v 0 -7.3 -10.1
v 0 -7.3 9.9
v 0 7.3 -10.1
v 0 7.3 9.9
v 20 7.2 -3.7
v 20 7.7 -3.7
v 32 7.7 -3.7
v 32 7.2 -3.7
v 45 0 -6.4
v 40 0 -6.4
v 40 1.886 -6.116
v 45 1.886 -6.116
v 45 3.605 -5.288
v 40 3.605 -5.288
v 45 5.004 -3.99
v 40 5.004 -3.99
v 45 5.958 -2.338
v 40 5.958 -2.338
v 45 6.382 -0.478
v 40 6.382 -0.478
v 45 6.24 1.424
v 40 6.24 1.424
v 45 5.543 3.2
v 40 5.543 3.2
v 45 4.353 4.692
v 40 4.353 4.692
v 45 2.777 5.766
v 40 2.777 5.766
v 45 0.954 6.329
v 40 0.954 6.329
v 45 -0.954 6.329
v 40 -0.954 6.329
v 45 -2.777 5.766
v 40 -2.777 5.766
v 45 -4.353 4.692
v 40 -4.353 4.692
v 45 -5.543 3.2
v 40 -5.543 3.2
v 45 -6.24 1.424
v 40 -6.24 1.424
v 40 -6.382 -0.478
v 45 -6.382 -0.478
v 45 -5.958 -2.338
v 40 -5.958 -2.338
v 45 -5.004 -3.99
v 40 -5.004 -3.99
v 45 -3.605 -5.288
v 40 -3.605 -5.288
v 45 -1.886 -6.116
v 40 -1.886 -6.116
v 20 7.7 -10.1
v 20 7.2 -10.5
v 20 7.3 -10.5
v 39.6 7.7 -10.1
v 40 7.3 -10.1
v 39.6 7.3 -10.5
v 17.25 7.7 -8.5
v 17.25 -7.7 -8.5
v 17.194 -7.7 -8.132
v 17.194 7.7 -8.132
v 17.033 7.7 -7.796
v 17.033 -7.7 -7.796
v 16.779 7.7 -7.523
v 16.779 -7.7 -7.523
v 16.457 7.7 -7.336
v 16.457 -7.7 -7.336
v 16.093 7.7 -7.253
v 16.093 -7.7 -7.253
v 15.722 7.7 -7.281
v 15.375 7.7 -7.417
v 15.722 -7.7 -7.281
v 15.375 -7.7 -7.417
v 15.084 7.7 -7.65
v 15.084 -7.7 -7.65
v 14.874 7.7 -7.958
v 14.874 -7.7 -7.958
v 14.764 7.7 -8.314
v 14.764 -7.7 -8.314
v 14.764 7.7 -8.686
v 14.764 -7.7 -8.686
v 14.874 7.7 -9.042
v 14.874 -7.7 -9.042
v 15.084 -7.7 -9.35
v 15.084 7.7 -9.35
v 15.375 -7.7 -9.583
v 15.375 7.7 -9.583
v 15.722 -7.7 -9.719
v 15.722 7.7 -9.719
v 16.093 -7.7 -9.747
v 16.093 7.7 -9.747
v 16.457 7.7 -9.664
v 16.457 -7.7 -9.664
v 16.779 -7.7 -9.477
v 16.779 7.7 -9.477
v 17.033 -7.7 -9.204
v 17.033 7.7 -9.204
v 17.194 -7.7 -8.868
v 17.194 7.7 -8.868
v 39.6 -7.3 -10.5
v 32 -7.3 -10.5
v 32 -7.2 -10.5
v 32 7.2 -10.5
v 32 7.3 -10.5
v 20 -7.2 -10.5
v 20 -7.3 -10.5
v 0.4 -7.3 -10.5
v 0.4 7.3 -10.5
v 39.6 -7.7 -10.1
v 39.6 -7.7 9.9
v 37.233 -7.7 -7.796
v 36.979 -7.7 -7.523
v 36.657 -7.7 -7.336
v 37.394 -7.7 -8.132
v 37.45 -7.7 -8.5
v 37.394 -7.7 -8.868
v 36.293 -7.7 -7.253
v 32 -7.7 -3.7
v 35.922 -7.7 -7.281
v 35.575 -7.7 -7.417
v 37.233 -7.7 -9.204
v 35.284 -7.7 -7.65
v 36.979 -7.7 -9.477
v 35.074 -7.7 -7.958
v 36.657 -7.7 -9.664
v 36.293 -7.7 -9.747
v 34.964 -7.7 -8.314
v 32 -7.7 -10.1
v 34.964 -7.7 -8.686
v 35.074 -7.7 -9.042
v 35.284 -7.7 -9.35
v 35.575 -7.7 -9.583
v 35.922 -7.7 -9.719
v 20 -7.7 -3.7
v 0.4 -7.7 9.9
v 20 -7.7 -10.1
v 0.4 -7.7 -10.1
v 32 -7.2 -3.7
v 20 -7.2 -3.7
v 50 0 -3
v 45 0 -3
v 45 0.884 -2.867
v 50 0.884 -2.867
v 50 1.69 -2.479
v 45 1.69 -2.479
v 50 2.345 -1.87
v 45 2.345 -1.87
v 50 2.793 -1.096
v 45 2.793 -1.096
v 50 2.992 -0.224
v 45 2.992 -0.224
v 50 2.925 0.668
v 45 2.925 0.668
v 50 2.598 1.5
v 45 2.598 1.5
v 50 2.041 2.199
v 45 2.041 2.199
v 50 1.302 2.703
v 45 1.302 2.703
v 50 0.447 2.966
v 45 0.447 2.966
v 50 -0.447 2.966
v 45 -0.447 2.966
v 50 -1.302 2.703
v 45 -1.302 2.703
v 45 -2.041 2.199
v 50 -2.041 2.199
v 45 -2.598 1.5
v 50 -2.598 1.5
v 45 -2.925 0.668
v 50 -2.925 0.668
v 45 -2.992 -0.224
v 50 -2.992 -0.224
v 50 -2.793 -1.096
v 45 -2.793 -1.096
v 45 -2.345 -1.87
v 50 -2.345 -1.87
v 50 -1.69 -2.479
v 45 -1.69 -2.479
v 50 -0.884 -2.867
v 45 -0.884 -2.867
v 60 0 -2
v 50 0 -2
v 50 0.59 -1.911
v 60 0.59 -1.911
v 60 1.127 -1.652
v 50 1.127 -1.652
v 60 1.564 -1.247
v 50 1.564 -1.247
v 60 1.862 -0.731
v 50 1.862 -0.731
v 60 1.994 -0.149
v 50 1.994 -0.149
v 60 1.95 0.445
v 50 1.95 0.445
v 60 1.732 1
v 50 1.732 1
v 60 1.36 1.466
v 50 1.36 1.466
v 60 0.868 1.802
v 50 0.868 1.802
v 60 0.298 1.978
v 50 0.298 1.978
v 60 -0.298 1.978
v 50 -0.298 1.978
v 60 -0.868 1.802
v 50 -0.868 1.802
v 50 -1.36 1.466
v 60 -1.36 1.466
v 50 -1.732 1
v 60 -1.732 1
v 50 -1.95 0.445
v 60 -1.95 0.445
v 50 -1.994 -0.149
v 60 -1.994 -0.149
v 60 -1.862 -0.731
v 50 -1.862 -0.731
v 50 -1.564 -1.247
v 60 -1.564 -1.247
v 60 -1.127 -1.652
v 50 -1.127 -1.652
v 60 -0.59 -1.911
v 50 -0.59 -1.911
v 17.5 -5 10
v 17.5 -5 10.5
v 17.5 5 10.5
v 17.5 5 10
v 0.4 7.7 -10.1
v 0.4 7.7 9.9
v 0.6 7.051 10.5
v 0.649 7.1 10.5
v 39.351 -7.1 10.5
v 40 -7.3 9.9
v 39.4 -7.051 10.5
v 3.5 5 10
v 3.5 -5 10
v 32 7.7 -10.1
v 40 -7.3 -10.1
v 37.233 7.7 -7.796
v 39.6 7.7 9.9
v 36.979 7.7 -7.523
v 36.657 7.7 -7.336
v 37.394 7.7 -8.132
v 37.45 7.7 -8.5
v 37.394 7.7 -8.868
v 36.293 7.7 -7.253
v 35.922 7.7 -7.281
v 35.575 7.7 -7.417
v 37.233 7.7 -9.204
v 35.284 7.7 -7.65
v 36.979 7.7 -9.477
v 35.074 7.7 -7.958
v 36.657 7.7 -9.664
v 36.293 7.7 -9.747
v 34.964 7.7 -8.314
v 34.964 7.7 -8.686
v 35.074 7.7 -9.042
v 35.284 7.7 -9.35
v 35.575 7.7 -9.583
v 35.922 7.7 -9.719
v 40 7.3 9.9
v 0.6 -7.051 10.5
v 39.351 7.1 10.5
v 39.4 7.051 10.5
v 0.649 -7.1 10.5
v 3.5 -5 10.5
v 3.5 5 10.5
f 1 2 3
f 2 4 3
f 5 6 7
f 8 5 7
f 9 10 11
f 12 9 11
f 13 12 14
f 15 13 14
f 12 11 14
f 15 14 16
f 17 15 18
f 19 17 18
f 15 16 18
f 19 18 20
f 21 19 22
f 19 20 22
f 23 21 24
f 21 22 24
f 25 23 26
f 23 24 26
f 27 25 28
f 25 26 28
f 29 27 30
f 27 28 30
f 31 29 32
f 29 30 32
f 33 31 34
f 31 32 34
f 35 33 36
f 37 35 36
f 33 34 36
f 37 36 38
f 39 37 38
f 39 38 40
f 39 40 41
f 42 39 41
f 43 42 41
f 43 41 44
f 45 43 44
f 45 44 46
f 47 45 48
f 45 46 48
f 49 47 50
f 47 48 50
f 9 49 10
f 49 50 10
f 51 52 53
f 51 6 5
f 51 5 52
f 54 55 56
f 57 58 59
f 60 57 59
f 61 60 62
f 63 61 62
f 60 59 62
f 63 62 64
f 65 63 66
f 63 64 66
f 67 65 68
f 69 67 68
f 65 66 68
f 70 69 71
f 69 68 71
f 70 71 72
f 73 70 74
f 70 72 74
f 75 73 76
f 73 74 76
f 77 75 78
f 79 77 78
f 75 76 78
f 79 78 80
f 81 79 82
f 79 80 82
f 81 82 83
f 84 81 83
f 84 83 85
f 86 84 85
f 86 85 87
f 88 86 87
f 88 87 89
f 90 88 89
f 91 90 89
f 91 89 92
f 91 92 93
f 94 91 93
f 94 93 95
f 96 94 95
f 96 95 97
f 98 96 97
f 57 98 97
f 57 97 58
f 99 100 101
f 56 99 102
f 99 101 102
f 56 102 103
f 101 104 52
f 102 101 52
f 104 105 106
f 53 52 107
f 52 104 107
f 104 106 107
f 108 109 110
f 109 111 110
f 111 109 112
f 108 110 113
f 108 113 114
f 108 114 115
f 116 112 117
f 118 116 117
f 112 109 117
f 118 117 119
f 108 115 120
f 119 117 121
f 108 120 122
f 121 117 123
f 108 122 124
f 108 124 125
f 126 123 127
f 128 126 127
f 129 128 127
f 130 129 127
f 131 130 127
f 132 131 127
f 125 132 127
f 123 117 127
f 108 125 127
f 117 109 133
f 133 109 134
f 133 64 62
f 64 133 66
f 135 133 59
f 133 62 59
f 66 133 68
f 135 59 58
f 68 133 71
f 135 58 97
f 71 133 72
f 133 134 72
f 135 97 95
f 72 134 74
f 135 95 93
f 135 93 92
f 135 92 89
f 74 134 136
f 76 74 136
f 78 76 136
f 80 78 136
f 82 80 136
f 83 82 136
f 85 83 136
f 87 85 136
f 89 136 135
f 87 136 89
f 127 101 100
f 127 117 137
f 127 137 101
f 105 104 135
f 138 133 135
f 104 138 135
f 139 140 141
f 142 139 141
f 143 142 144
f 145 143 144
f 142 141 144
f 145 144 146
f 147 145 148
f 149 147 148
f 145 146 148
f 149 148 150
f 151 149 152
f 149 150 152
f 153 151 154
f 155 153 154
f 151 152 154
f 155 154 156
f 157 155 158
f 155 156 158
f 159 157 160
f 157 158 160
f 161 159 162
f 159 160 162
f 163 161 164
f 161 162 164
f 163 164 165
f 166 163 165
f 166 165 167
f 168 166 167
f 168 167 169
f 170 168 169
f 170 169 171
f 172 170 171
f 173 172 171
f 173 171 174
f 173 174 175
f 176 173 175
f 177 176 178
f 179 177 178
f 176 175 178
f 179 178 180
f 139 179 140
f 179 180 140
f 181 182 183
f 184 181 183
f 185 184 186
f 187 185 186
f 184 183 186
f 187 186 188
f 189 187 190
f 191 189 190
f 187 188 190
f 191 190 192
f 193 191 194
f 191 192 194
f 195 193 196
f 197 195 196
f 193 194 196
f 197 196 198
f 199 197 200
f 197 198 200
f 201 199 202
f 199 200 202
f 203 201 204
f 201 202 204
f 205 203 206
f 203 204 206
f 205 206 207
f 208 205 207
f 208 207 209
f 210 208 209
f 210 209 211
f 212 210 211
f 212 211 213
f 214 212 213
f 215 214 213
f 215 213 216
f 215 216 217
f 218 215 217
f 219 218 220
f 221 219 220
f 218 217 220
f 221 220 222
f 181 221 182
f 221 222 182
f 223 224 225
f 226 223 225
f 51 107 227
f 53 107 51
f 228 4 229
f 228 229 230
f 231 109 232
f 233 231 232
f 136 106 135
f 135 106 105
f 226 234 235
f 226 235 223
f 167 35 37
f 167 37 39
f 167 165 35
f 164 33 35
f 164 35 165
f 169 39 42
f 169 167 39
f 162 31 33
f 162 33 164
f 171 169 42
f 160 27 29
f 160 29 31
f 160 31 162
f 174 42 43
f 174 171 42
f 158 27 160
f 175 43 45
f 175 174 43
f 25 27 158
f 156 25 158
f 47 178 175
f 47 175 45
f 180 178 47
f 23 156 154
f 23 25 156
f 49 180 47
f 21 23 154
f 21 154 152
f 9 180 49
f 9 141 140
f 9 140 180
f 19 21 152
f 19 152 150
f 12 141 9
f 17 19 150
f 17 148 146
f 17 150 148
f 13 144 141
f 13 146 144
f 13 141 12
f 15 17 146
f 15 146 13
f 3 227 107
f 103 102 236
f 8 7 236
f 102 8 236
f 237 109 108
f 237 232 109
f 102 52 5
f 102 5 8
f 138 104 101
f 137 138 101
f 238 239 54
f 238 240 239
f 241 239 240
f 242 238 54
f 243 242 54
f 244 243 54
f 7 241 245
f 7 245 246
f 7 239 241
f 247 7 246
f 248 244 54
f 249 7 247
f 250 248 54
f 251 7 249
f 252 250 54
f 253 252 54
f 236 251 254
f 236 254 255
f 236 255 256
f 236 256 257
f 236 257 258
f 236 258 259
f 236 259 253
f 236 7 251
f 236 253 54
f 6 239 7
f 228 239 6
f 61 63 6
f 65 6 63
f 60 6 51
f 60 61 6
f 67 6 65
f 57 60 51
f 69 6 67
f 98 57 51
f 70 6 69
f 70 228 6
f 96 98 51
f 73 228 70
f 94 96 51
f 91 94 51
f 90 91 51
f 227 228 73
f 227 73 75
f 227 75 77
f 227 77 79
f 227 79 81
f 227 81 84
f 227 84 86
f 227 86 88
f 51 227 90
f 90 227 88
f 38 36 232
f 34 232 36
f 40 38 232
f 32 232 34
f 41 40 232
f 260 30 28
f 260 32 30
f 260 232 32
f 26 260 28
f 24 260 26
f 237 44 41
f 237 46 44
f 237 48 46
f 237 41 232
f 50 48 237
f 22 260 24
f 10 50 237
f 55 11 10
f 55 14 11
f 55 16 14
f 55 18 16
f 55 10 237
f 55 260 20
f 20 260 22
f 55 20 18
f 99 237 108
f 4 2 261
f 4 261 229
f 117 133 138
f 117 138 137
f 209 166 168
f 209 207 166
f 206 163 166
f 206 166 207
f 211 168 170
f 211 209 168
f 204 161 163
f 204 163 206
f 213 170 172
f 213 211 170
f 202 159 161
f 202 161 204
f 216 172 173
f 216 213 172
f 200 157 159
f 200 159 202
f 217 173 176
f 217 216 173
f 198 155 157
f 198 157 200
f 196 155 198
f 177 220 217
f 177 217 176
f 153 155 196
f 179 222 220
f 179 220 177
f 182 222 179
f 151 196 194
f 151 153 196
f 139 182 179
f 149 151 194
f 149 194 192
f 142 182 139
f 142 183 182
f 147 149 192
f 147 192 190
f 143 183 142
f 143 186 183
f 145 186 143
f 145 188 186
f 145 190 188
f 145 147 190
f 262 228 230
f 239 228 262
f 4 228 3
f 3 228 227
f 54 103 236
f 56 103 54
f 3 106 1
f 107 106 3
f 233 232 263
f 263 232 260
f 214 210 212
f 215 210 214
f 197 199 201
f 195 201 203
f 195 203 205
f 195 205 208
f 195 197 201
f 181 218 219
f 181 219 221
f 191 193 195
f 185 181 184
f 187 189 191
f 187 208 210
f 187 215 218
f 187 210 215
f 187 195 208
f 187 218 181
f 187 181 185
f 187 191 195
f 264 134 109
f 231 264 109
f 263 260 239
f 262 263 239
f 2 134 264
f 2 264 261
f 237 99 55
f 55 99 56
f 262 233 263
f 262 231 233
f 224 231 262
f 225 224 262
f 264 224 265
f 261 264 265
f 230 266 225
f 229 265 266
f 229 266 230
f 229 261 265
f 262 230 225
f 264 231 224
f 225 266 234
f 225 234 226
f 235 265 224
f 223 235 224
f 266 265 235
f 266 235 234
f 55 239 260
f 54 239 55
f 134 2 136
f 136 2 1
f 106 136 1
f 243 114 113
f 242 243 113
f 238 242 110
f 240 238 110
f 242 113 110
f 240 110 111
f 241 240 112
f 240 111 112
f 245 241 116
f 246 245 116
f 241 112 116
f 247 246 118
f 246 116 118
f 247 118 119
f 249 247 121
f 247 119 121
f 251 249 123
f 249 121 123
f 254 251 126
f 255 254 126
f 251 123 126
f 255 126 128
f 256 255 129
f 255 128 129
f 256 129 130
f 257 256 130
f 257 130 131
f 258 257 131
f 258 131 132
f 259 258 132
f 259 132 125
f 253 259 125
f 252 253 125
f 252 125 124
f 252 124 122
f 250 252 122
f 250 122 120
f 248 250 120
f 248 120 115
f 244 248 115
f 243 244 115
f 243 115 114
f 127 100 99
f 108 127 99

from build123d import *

# Parameters (mm, degrees)
SKETCH1_W           = 21
SKETCH1_H           = 15.4
BOSS_EXTRUDE1_DEPTH = 40
SKETCH2_W           = 14
SKETCH2_H           = 10
CUT_EXTRUDE1_DEPTH  = 0.5
SKETCH3_W           = 12
SKETCH3_H           = 6.8
CUT_EXTRUDE2_DEPTH  = 0.5
CUT_EXTRUDE3_START  = -15.4
SKETCH3_2_W         = 12
SKETCH3_2_H         = 6.8
CUT_EXTRUDE3_DEPTH  = 0.5
M3_TAPPED_HOLE1_D   = 2.5
M3_TAPPED_HOLE2_D   = 2.5
SKETCH8_R           = 6.4
BOSS_EXTRUDE3_DEPTH = 5
SKETCH9_R           = 3
BOSS_EXTRUDE4_DEPTH = 5
SKETCH10_R          = 2
BOSS_EXTRUDE5_DEPTH = 10
CHAMFER1_SIZE       = 0.4
CHAMFER2_SIZE       = 0.6


with BuildPart() as part:
    # Sketch1 → Boss-Extrude1 (new body)
    with BuildSketch(Plane(origin=(0, 0, 0), x_dir=(0, 0, -1), z_dir=(1, 0, 0))):
        Rectangle(SKETCH1_W, SKETCH1_H)
    extrude(amount=BOSS_EXTRUDE1_DEPTH)

    # Sketch2 → Cut-Extrude1 (cut)
    with BuildSketch(Plane.XY.offset(10.5)):
        with Locations((10.5, 0)):
            Rectangle(SKETCH2_W, SKETCH2_H)
    extrude(amount=-CUT_EXTRUDE1_DEPTH, mode=Mode.SUBTRACT)

    # Sketch3 → Cut-Extrude2 (cut)
    with BuildSketch(Plane(origin=(0, 7.7, 0), x_dir=(1, 0, 0), z_dir=(0, 1, 0))):
        with Locations((26, 7.1)):
            Rectangle(SKETCH3_W, SKETCH3_H)
    extrude(amount=-CUT_EXTRUDE2_DEPTH, mode=Mode.SUBTRACT)

    # Sketch3<2> → Cut-Extrude3 (cut)
    with BuildSketch(Plane(origin=(0, 7.7, 0), x_dir=(1, 0, 0), z_dir=(0, 1, 0)).offset(CUT_EXTRUDE3_START)):
        with Locations((26, 7.1)):
            Rectangle(SKETCH3_2_W, SKETCH3_2_H)
    extrude(amount=CUT_EXTRUDE3_DEPTH, mode=Mode.SUBTRACT)

    # M3 Tapped Hole1 (through all)
    with Locations(Plane(origin=(0, 7.7, 0), x_dir=(-1, 0, 0), z_dir=(0, 1, 0))):
        with Locations((-36.2, -8.5)):
            Hole(M3_TAPPED_HOLE1_D / 2)

    # M3 Tapped Hole2 (through all)
    with Locations(Plane(origin=(0, 7.7, 0), x_dir=(-1, 0, 0), z_dir=(0, 1, 0))):
        with Locations((-16, -8.5)):
            Hole(M3_TAPPED_HOLE2_D / 2)

    # Sketch8 → Boss-Extrude3 (add)
    with BuildSketch(Plane(origin=(40, 0, 0), x_dir=(0, 0, -1), z_dir=(1, 0, 0))):
        Circle(SKETCH8_R)
    extrude(amount=BOSS_EXTRUDE3_DEPTH)

    # Sketch9 → Boss-Extrude4 (add)
    with BuildSketch(Plane(origin=(45, 0, 0), x_dir=(0, 0, -1), z_dir=(1, 0, 0))):
        Circle(SKETCH9_R)
    extrude(amount=BOSS_EXTRUDE4_DEPTH)

    # Sketch10 → Boss-Extrude5 (add)
    with BuildSketch(Plane(origin=(50, 0, 0), x_dir=(0, 0, -1), z_dir=(1, 0, 0))):
        Circle(SKETCH10_R)
    extrude(amount=BOSS_EXTRUDE5_DEPTH)

    # Chamfer1
    chamfer1_edges = [part.edges().sort_by_distance(p)[0] for p in [
        (40, -7.7, 0),
        (10, 7.7, -10.5),
        (40, 0, -10.5),
        (10, -7.7, -10.5),
        (0, -7.7, 0),
        (0, 7.7, 0),
        (0, 0, -10.5),
        (40, 7.7, 0),
        (36, -7.7, -10.5),
        (36, 7.7, -10.5),
    ]]
    chamfer(chamfer1_edges, length=CHAMFER1_SIZE)

    # Chamfer2
    chamfer2_edges = [part.edges().sort_by_distance(p)[0] for p in [
        (40, 0, 10.5),
        (0, 0, 10.5),
        (20, -7.7, 10.5),
        (20, 7.7, 10.5),
        (0.2, -7.5, 10.5),
        (0.2, 7.5, 10.5),
        (39.8, -7.5, 10.5),
        (39.8, 7.5, 10.5),
    ]]
    chamfer(chamfer2_edges, length=CHAMFER2_SIZE)


solid = part.part
